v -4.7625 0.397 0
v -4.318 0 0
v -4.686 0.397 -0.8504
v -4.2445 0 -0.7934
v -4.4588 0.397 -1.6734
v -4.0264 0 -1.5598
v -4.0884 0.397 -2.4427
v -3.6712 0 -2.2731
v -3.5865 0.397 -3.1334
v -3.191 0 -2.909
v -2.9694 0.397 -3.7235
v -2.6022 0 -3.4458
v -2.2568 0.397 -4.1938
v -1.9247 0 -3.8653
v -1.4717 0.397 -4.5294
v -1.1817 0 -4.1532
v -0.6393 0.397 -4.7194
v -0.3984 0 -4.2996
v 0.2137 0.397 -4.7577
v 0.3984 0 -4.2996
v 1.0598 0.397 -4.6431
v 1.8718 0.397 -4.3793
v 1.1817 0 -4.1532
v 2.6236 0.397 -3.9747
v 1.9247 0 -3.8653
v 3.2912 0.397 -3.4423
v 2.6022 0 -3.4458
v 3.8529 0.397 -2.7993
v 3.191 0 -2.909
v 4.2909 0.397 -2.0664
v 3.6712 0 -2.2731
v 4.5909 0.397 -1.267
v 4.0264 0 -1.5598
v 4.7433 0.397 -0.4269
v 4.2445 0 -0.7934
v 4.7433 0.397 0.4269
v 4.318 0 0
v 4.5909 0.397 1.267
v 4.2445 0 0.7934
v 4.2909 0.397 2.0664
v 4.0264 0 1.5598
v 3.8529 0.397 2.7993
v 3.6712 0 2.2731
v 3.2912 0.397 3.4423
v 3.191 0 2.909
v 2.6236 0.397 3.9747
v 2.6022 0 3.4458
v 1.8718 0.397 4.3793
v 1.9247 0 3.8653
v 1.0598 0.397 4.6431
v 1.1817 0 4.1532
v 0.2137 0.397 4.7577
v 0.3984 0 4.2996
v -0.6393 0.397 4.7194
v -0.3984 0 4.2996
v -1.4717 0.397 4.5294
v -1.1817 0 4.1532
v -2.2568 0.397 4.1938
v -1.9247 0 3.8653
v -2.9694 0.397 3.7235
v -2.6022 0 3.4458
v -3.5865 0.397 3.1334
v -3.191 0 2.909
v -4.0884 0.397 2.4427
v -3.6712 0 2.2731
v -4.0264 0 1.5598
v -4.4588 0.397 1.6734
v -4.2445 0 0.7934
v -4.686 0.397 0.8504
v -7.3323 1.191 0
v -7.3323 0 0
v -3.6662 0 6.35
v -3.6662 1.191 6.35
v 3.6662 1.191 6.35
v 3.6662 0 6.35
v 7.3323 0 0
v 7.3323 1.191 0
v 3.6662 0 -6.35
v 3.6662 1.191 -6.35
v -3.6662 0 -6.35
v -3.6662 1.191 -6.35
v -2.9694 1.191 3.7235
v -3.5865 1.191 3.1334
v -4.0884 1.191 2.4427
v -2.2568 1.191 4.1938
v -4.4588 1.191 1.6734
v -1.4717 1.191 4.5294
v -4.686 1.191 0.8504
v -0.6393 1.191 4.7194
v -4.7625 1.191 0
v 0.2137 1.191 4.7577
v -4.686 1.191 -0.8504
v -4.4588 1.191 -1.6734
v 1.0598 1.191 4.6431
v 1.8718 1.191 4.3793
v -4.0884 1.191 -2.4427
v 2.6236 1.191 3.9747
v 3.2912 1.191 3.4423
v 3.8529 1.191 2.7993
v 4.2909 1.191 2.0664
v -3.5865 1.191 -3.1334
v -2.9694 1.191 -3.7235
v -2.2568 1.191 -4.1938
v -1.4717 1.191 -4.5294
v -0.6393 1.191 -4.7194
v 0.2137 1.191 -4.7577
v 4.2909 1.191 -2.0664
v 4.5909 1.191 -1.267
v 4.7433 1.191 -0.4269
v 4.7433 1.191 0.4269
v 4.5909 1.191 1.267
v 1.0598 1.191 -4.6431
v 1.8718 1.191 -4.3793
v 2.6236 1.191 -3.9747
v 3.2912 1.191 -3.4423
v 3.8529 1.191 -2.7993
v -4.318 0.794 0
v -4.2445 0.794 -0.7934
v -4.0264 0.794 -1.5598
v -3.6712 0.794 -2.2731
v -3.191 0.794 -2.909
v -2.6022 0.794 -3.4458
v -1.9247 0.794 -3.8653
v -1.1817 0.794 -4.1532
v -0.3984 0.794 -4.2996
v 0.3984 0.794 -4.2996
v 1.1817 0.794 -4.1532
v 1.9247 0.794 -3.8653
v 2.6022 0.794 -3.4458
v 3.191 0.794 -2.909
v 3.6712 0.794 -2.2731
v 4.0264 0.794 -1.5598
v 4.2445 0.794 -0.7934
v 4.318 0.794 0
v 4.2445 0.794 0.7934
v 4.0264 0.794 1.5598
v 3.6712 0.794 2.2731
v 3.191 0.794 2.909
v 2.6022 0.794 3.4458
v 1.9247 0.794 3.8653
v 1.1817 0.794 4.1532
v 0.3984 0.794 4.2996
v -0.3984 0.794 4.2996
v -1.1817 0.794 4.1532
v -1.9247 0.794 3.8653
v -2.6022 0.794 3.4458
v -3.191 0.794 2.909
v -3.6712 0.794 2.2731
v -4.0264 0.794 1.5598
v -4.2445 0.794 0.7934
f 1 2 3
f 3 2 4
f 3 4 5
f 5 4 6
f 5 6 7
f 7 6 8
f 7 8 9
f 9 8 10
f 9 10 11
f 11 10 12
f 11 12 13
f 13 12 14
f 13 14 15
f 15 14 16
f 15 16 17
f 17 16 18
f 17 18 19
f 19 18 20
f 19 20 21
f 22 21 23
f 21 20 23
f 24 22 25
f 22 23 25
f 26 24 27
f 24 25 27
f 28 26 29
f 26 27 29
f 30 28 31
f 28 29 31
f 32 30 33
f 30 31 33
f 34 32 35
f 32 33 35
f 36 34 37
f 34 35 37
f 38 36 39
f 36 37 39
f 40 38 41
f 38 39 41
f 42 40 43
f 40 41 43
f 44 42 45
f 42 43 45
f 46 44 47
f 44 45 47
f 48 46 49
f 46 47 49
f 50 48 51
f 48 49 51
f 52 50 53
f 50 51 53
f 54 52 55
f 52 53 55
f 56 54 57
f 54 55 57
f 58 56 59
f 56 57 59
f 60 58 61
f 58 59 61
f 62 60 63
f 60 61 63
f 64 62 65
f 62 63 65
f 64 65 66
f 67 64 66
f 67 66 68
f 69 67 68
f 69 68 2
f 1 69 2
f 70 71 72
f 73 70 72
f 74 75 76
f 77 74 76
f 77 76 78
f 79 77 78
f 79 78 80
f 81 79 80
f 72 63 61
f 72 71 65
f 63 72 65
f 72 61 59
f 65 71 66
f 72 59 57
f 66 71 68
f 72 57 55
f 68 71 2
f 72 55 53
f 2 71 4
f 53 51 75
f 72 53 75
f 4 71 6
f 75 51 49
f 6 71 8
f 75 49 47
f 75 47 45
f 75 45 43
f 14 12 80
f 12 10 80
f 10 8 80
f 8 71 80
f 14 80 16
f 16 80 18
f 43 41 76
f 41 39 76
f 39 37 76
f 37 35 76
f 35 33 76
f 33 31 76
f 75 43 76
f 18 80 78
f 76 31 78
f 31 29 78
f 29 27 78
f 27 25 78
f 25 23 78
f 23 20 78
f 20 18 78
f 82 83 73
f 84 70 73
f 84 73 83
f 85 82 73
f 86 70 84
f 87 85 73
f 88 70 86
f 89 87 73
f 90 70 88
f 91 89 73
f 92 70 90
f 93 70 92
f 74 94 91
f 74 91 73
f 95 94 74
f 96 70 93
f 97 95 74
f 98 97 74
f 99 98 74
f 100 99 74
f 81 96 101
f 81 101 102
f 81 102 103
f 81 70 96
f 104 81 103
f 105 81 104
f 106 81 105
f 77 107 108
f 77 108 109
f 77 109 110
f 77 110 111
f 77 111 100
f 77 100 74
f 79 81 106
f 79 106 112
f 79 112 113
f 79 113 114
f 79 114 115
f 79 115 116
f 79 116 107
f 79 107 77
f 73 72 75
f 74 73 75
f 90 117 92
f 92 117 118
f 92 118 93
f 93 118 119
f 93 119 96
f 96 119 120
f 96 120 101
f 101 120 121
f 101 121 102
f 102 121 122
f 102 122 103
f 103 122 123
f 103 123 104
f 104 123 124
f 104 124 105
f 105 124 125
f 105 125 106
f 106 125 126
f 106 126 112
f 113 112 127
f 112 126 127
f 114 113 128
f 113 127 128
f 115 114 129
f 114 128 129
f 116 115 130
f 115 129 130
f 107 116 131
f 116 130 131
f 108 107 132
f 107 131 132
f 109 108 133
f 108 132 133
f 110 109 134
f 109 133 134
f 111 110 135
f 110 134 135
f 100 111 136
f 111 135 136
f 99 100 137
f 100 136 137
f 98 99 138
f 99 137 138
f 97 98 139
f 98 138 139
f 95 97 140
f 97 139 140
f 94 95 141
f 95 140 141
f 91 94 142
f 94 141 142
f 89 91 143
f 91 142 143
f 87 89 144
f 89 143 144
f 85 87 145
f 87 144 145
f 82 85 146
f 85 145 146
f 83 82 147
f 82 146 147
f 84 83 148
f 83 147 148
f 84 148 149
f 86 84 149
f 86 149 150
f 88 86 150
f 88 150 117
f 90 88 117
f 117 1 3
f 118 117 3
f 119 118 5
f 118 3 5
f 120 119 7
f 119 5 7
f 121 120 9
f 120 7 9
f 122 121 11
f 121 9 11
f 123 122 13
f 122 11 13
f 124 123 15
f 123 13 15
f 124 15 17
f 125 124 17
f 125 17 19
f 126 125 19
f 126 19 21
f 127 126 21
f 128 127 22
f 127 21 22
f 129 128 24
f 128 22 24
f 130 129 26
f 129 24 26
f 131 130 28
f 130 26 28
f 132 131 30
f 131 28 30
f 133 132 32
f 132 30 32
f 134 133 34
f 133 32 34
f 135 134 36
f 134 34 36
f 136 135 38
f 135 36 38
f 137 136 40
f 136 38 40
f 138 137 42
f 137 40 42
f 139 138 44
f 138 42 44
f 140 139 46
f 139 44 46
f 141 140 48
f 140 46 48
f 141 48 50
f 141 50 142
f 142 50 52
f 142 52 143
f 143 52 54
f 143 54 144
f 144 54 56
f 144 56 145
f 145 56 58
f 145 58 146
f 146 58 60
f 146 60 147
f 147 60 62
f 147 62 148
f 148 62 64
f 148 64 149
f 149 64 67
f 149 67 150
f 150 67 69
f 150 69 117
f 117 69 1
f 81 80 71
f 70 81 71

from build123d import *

# Parameters (mm, degrees)
SKETCH1_R           = 4.318
BOSS_EXTRUDE1_DEPTH = 1.191006


with BuildPart() as part:
    # Sketch1 → Boss-Extrude1 (new body)
    with BuildSketch(Plane(origin=(0, 0, 0), x_dir=(1, 0, 0), z_dir=(0, 1, 0))):
        Polygon((7.332348419, 0), (3.666174209, 6.35), (-3.666174209, 6.35), (-7.332348419, 0), (-3.666174209, -6.35), (3.666174209, -6.35), align=None)
        with Locations(Location((0, 0, 0), (0, 0, 270))):
            Circle(SKETCH1_R, mode=Mode.SUBTRACT)
    extrude(amount=BOSS_EXTRUDE1_DEPTH)

    # Sketch2 → Cut-Revolve1 (revolve, cut)
    with BuildSketch(Plane.XY, mode=Mode.PRIVATE) as cut_revolve1_sk:
        Polygon((4.7625, 1.191006), (4.318, 0.794004), (4.7625, 0.397002), (4.318, 0), (0, 0), (0, 1.191006), align=None)
    revolve(cut_revolve1_sk.sketch.rotate(Axis((0, 1.191006, 0), (0, -1, 0)), 180), axis=Axis((0, 1.191006, 0), (0, -1, 0)), mode=Mode.SUBTRACT)


solid = part.part
